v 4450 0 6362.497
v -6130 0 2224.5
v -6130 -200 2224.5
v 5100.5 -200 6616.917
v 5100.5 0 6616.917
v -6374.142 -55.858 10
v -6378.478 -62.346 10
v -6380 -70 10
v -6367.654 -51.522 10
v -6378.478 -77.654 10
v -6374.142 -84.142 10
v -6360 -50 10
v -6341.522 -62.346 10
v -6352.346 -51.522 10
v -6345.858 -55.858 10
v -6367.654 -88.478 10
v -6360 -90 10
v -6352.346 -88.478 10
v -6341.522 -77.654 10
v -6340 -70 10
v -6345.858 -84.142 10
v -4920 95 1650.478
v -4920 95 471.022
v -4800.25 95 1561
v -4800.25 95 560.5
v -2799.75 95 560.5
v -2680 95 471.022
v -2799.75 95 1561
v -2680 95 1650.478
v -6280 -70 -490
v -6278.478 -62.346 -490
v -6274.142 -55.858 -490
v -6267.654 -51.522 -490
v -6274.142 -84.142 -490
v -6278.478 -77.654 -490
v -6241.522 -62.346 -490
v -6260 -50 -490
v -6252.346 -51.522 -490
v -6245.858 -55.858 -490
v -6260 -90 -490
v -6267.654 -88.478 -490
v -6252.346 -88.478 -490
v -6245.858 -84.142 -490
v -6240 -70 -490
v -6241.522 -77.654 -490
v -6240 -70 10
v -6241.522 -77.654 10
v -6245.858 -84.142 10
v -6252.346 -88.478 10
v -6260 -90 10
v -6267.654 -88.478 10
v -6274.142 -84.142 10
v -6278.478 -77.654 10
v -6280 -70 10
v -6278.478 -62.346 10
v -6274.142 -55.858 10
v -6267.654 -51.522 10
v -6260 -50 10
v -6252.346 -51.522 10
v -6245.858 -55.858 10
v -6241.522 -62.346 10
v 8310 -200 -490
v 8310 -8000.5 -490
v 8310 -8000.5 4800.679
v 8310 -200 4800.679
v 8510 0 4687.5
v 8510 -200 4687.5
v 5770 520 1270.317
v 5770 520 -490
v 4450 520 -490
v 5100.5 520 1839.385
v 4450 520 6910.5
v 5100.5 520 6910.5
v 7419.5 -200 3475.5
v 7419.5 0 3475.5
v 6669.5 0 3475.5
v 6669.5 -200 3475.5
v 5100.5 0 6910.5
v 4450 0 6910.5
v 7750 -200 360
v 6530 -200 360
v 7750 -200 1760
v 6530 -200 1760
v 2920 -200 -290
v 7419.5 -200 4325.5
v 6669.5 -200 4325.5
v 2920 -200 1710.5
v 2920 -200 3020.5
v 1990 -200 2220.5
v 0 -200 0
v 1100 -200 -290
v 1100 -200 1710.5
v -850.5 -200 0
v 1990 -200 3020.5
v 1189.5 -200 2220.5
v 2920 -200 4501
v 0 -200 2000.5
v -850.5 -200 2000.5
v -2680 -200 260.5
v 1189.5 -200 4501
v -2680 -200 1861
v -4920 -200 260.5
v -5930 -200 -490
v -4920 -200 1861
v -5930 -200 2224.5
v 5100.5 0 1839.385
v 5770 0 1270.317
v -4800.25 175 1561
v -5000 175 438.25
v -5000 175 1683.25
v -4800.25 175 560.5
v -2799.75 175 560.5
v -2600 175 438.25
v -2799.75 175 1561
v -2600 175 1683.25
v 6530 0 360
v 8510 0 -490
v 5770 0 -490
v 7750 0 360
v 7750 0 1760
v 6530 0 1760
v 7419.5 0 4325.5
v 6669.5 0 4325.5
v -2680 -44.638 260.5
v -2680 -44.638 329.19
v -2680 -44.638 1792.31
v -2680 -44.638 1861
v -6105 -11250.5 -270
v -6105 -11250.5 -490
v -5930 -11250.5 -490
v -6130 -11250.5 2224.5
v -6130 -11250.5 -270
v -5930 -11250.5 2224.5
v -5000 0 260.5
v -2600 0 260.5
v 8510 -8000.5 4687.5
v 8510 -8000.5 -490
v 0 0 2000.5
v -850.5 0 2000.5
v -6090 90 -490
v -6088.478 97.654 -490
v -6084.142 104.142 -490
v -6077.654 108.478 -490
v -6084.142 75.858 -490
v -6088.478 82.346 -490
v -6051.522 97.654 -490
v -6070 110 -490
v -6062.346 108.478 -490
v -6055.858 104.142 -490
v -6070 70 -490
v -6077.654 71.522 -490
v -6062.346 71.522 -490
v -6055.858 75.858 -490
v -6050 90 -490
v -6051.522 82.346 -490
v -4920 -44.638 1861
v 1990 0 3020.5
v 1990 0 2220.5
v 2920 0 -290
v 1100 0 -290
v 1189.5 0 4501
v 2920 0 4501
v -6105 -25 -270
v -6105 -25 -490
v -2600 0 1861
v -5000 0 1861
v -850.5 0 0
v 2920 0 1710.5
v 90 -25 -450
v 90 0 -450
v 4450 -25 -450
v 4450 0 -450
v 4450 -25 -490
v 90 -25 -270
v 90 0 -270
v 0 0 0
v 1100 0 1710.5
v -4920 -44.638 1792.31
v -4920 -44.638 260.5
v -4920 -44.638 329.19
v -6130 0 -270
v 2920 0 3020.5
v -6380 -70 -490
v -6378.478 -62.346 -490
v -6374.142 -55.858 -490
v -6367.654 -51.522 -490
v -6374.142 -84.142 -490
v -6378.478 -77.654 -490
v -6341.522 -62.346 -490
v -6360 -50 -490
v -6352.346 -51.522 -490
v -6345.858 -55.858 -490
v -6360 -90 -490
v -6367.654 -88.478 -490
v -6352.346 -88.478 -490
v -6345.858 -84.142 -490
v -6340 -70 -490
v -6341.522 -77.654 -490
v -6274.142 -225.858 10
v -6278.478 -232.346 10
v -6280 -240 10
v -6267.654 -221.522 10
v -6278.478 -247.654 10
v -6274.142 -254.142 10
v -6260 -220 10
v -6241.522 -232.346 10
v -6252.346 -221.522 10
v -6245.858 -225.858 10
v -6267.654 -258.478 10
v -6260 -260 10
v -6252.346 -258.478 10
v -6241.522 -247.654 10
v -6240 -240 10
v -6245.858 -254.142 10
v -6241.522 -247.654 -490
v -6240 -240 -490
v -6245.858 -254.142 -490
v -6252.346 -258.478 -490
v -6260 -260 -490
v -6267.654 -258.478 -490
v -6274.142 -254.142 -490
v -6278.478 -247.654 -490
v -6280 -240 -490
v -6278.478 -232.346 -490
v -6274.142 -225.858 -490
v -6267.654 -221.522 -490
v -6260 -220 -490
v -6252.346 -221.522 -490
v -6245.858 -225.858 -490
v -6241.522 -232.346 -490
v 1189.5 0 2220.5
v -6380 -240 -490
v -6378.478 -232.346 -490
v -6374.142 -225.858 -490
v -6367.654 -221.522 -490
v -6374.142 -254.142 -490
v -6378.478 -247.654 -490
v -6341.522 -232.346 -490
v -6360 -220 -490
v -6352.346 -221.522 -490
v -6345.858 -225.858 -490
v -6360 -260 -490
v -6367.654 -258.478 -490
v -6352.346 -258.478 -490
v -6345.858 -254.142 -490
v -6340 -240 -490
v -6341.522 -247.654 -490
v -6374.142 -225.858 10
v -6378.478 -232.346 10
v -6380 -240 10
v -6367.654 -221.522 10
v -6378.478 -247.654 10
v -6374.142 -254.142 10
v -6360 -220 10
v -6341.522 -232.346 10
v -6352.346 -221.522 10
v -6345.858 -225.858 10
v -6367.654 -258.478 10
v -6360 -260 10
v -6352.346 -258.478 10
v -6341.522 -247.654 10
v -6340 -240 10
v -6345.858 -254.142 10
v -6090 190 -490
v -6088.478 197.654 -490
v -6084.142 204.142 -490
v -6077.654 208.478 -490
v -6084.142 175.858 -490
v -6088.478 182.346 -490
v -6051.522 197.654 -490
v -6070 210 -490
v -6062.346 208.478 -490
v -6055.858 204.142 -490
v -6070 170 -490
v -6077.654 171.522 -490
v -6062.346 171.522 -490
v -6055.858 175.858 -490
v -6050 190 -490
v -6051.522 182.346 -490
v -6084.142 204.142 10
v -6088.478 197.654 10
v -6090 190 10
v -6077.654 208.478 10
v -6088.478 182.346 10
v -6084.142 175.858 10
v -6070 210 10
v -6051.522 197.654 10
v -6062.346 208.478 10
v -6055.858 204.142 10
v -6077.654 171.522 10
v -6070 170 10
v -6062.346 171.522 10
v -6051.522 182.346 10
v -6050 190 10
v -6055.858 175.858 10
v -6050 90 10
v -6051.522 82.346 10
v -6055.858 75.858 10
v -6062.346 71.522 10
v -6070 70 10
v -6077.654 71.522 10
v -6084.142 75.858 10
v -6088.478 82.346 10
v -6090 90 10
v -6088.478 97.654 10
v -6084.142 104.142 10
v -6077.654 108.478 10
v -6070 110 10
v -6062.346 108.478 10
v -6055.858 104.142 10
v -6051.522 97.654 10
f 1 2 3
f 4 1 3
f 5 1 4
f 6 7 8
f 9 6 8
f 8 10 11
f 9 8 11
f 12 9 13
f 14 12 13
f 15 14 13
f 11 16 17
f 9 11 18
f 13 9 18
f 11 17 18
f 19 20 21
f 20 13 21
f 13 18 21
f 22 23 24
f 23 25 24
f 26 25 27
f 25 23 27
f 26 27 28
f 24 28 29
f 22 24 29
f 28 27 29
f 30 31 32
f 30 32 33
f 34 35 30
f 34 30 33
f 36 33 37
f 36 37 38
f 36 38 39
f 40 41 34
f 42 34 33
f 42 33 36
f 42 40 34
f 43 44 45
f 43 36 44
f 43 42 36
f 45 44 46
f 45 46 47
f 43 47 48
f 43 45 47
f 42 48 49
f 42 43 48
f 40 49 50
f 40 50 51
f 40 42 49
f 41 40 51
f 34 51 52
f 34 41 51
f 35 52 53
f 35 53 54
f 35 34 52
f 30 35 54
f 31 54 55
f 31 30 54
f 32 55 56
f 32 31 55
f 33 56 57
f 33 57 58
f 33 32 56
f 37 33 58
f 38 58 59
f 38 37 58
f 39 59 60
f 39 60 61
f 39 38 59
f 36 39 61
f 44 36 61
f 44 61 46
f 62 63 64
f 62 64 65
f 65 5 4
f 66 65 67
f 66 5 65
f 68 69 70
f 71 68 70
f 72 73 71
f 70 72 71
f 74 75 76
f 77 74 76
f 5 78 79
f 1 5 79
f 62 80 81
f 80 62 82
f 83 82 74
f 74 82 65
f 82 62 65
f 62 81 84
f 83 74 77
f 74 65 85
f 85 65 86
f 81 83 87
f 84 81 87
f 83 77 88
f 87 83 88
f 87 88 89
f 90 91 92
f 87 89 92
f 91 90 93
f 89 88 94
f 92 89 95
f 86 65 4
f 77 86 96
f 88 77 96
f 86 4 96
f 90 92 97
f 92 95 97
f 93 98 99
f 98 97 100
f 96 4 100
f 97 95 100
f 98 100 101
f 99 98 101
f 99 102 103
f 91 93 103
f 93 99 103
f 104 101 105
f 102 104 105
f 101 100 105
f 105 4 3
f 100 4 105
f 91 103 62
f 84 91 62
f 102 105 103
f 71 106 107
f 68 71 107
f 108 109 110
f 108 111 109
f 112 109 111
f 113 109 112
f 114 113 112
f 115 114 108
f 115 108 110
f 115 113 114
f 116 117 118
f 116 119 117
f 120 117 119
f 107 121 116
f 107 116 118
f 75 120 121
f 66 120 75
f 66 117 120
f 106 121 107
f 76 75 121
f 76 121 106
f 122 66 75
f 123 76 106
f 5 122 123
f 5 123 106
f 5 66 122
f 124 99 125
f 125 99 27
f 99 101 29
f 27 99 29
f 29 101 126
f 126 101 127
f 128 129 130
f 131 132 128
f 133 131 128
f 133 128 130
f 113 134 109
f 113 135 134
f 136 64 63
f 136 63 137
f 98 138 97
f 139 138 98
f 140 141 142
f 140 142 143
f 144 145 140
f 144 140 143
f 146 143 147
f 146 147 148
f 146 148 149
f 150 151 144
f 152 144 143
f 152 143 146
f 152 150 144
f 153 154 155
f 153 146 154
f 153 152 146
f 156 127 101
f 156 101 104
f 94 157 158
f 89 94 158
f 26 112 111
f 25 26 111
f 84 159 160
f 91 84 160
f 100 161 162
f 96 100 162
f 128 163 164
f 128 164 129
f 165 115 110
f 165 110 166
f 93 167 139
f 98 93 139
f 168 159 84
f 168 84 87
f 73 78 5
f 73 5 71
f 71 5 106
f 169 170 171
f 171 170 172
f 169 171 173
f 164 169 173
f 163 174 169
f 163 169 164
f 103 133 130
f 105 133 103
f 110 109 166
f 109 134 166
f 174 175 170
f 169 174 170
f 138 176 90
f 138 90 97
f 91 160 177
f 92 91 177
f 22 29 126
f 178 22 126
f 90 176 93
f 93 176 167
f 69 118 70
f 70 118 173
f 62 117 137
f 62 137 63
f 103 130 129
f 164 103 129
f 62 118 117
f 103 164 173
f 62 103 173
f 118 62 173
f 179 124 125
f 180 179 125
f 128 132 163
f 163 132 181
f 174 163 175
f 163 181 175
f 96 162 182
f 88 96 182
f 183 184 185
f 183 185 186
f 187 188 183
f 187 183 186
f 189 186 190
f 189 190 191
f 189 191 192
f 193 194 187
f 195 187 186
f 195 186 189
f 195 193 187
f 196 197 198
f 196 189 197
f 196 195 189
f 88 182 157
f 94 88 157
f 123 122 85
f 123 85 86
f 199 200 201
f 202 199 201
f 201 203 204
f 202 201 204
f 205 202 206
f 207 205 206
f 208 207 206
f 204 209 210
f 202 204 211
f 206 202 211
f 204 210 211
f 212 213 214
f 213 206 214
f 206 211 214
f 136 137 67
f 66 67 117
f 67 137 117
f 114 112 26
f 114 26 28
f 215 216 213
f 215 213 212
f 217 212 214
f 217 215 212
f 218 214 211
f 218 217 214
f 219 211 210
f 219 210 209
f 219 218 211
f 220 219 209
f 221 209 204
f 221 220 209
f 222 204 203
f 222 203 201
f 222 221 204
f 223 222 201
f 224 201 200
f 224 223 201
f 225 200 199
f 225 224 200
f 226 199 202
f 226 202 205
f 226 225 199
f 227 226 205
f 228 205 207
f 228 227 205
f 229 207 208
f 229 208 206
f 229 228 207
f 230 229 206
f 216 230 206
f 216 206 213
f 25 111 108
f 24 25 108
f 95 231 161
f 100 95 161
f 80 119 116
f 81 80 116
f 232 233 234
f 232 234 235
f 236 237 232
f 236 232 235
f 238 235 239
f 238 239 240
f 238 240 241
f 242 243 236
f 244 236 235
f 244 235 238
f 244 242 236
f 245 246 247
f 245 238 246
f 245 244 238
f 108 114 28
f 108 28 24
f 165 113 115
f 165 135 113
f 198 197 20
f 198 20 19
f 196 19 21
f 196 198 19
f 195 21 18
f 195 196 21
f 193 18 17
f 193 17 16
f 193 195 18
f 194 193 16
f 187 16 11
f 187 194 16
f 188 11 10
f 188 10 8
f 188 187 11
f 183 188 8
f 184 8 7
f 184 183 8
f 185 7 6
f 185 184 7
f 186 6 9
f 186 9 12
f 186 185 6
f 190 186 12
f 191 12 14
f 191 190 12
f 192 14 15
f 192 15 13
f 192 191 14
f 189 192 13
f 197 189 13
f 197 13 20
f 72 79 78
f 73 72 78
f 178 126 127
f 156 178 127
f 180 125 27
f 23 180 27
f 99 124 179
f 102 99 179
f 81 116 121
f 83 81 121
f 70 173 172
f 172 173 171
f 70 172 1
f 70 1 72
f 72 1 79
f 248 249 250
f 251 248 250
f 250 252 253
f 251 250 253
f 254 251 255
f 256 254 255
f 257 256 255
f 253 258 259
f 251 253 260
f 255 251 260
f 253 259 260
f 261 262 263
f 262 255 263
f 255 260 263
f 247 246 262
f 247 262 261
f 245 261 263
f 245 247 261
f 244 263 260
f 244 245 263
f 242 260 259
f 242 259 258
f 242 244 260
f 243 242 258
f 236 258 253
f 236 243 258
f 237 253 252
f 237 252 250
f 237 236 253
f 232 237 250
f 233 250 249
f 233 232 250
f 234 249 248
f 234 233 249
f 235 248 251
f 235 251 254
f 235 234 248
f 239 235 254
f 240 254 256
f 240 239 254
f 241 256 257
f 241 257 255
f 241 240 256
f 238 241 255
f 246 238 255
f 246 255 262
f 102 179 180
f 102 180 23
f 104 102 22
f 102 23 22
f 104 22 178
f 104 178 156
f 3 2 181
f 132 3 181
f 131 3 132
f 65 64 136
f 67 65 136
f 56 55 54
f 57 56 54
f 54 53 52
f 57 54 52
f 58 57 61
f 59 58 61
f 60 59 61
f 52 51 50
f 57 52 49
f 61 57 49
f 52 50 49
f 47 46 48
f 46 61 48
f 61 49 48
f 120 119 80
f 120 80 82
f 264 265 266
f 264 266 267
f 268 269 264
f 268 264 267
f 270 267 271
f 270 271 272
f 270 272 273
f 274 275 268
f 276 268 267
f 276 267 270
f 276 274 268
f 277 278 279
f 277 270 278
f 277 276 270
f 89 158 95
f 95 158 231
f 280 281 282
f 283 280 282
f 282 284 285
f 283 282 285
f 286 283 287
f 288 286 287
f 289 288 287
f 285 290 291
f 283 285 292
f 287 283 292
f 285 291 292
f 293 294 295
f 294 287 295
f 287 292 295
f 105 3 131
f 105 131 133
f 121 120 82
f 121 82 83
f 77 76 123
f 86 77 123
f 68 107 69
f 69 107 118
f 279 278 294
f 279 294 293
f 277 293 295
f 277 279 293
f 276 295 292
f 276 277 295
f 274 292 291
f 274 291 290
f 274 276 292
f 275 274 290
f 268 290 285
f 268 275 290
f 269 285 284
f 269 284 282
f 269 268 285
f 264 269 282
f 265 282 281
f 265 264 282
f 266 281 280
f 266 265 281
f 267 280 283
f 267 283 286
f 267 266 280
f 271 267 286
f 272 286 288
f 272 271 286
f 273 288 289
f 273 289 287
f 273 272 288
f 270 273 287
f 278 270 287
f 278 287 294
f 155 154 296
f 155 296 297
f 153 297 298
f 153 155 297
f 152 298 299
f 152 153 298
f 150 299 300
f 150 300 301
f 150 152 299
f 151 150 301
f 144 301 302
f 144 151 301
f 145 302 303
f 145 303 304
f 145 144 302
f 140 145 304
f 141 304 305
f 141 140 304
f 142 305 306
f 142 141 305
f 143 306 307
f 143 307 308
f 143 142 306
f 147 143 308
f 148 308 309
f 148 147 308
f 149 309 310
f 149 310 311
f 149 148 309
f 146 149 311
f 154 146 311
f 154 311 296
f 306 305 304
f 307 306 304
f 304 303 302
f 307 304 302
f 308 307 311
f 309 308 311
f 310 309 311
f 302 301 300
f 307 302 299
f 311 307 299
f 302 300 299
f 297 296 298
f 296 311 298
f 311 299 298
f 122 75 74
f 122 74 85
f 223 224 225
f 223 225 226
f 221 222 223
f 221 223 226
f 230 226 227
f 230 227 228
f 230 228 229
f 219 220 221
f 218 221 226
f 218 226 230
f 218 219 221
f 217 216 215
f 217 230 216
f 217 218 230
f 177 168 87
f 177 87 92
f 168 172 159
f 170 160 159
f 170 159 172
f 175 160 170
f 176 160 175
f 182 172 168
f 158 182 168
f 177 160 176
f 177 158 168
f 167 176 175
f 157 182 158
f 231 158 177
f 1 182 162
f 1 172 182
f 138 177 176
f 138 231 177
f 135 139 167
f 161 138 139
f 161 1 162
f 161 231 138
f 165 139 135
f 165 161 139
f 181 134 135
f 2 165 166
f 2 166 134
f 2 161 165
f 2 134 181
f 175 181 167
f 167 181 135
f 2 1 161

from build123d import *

# Parameters (mm, degrees)
F1_DEPTH      = 2224.5
F1_DEPTH_BACK = 490
F2_W          = 850.5
F2_H          = 2000.5
F2_W_2        = 1820
F2_W_3        = 1220
F2_H_2        = 1400
F3_DEPTH      = 200
F4_W          = 2240
F4_H          = 1600.5
F5_DEPTH      = 200
F7_DEPTH      = 2240
F9_DEPTH      = 80
F10_START     = -2320
F10_DEPTH     = 80
F11_W         = 2000.5
F11_H         = 1000.5
F12_DEPTH     = 80
F14_DEPTH     = 200
F14_FACE_W    = 200
F14_FACE_H    = 7800.5
F15_REACH     = 12195.4815488388
F2_W_4        = 750
F2_H_3        = 850
F16_DEPTH     = 200
F18_DEPTH     = 200
F20_DEPTH     = 520
F22_DEPTH     = 25
F23_W         = 11225.5
F23_H         = 220
F24_DEPTH     = 25
F25_R         = 20
F26_DEPTH     = 500


with BuildPart() as f1:
    # F0 (on Top) → F1 (new body, two sides)
    with BuildSketch(Plane.XY) as f1_sk:
        Polygon((8510, 0), (-6130, 0), (-6130, -11250.5), (-5930, -11250.5), (-5930, -200), (8310, -200), (8310, -8000.5), (8510, -8000.5), align=None)
    extrude(amount=F1_DEPTH)
    extrude(f1_sk.sketch, amount=-F1_DEPTH_BACK)

    # F2 (on face) → F3 (cut, through all)
    with BuildSketch(Plane(origin=(0, 0, 0), x_dir=(-1, 0, 0), z_dir=(0, 1, 0))):
        with Locations((425.25, 1000.25)):
            Rectangle(F2_W, F2_H)
        with Locations((-2010, 710.25)):
            Rectangle(F2_W_2, F2_H)
        with Locations((-7140, 1060)):
            Rectangle(F2_W_3, F2_H_2)
    extrude(amount=-F3_DEPTH, mode=Mode.SUBTRACT)

    # F4 (on face) → F5 (cut, through all)
    with BuildSketch(Plane(origin=(0, 0, 0), x_dir=(-1, 0, 0), z_dir=(0, 1, 0))):
        with Locations((3800, 1060.75)):
            Rectangle(F4_W, F4_H)
    extrude(amount=-F5_DEPTH, mode=Mode.SUBTRACT)

    # F6 (on face) → F7 (join, through all)
    with BuildSketch(Plane(origin=(-2680, 0, 0), x_dir=(0, -1, 0), z_dir=(-1, 0, 0))):
        Polygon((44.6384282427, 1861), (0, 1861), (-175, 1683.25), (-175, 438.25), (0, 260.5), (44.6384282427, 260.5), (44.6384282427, 329.1895949349), (-95, 471.0223413358), (-95, 1650.4776586642), (44.6384282427, 1792.310405065), align=None)
    extrude(amount=F7_DEPTH)

    # F8 (on face) → F9 (join)
    with BuildSketch(Plane.YZ.offset(-2680)):
        Polygon((175, 438.25), (175, 1683.25), (0, 1861), (0, 260.5), align=None)
    extrude(amount=F9_DEPTH)

    # F9_face (on face) → F10 (join)
    with BuildSketch(Plane(origin=(-2600, 83.8560885609, 1060.75), x_dir=(0, 1, 0), z_dir=(1, 0, 0)).offset(F10_START)):
        Polygon((91.1439114391, -622.5), (91.1439114391, 622.5), (-83.8560885609, 800.25), (-83.8560885609, -800.25), align=None)
    extrude(amount=-F10_DEPTH)

    # F11 (on face) → F12 (cut, through all)
    with BuildSketch(Plane(origin=(0, 175, 0), x_dir=(-1, 0, 0), z_dir=(0, 1, 0))):
        with Locations((3800, 1060.7499999998)):
            Rectangle(F11_W, F11_H)
    extrude(amount=-F12_DEPTH, mode=Mode.SUBTRACT)

    # F13 (on face) → F14 (join, through all)
    with BuildSketch(Plane(origin=(0, 0, 0), x_dir=(-1, 0, 0), z_dir=(0, 1, 0))):
        Polygon((6130, 2224.5), (-5100.5, 6616.9170318604), (-8510, 4687.5), (-8510, 2224.5), align=None)
    extrude(amount=-F14_DEPTH)

    f15_end = Plane(origin=(6805.25, -100, 5652.2085159302), x_dir=(0.870310319, 0, -0.4925037549), z_dir=(0.4925037549, 0, 0.870310319))
    # F14_face (on face) → F15 (join, up to a plane its end follows)
    with BuildSketch(Plane(origin=(8410, -4100.25, 2224.5), x_dir=(1, 0, 0), z_dir=(0, 0, 1))):
        Rectangle(F14_FACE_W, F14_FACE_H)
    f15_long = extrude(amount=F15_REACH, mode=Mode.PRIVATE)
    add(split(f15_long, bisect_by=f15_end, keep=Keep.BOTTOM, mode=Mode.PRIVATE))

    # F2 (on face) → F16 (cut, through all)
    with BuildSketch(Plane(origin=(0, 0, 0), x_dir=(-1, 0, 0), z_dir=(0, 1, 0))):
        with Locations((-7044.5, 3900.5)):
            Rectangle(F2_W_4, F2_H_3)
    extrude(amount=-F16_DEPTH, mode=Mode.SUBTRACT)

    # F17 (on face) → F18 (cut, through all)
    with BuildSketch(Plane(origin=(0, 0, 0), x_dir=(-1, 0, 0), z_dir=(0, 1, 0))):
        Polygon((-2920, 4501), (-2920, 3020.5), (-1990, 3020.5), (-1990, 2220.5), (-1189.5, 2220.5), (-1189.5, 4501), align=None)
    extrude(amount=-F18_DEPTH, mode=Mode.SUBTRACT)

    # F19 (on face) → F20 (join)
    with BuildSketch(Plane(origin=(0, 0, 0), x_dir=(-1, 0, 0), z_dir=(0, 1, 0))):
        Polygon((-4450, 6910.5), (-5100.5, 6910.5), (-5100.5, 1839.3845928857), (-5770, 1270.3168166825), (-5770, -490), (-4450, -490), align=None)
    extrude(amount=F20_DEPTH)

    # F21 (on face) → F22 (cut)
    with BuildSketch(Plane(origin=(0, 0, 0), x_dir=(-1, 0, 0), z_dir=(0, 1, 0))):
        Polygon((6130, -490), (6130, -270), (-90, -270), (-90, -450), (-4450, -450), (-4450, -490), align=None)
    extrude(amount=-F22_DEPTH, mode=Mode.SUBTRACT)

    # F23 (on face) → F24 (cut)
    with BuildSketch(Plane(origin=(-6130, 0, 0), x_dir=(0, -1, 0), z_dir=(-1, 0, 0))):
        with Locations((5637.75, -380)):
            Rectangle(F23_W, F23_H)
    extrude(amount=-F24_DEPTH, mode=Mode.SUBTRACT)


with BuildPart() as f26:
    # F25 (on face) → F26 (new body)
    with BuildSketch(Plane(origin=(0, 0, -490), x_dir=(1, 0, 0), z_dir=(0, 0, -1))):
        with Locations((-6070, -190)):
            Circle(F25_R)
    extrude(amount=-F26_DEPTH)


with BuildPart() as f26b:
    # F25 (on face) → F26, piece 2 (new body)
    with BuildSketch(Plane(origin=(0, 0, -490), x_dir=(1, 0, 0), z_dir=(0, 0, -1))):
        with Locations((-6070, -90)):
            Circle(F25_R)
    extrude(amount=-F26_DEPTH)


with BuildPart() as f26c:
    # F25 (on face) → F26, piece 3 (new body)
    with BuildSketch(Plane(origin=(0, 0, -490), x_dir=(1, 0, 0), z_dir=(0, 0, -1))):
        with Locations((-6260, 70)):
            Circle(F25_R)
    extrude(amount=-F26_DEPTH)


with BuildPart() as f26d:
    # F25 (on face) → F26, piece 4 (new body)
    with BuildSketch(Plane(origin=(0, 0, -490), x_dir=(1, 0, 0), z_dir=(0, 0, -1))):
        with Locations((-6260, 240)):
            Circle(F25_R)
    extrude(amount=-F26_DEPTH)


with BuildPart() as f26e:
    # F25 (on face) → F26, piece 5 (new body)
    with BuildSketch(Plane(origin=(0, 0, -490), x_dir=(1, 0, 0), z_dir=(0, 0, -1))):
        with Locations((-6360, 240)):
            Circle(F25_R)
    extrude(amount=-F26_DEPTH)


with BuildPart() as f26f:
    # F25 (on face) → F26, piece 6 (new body)
    with BuildSketch(Plane(origin=(0, 0, -490), x_dir=(1, 0, 0), z_dir=(0, 0, -1))):
        with Locations((-6360, 70)):
            Circle(F25_R)
    extrude(amount=-F26_DEPTH)


solid = Compound([f1.part, f26.part, f26b.part, f26c.part, f26d.part, f26e.part, f26f.part])
